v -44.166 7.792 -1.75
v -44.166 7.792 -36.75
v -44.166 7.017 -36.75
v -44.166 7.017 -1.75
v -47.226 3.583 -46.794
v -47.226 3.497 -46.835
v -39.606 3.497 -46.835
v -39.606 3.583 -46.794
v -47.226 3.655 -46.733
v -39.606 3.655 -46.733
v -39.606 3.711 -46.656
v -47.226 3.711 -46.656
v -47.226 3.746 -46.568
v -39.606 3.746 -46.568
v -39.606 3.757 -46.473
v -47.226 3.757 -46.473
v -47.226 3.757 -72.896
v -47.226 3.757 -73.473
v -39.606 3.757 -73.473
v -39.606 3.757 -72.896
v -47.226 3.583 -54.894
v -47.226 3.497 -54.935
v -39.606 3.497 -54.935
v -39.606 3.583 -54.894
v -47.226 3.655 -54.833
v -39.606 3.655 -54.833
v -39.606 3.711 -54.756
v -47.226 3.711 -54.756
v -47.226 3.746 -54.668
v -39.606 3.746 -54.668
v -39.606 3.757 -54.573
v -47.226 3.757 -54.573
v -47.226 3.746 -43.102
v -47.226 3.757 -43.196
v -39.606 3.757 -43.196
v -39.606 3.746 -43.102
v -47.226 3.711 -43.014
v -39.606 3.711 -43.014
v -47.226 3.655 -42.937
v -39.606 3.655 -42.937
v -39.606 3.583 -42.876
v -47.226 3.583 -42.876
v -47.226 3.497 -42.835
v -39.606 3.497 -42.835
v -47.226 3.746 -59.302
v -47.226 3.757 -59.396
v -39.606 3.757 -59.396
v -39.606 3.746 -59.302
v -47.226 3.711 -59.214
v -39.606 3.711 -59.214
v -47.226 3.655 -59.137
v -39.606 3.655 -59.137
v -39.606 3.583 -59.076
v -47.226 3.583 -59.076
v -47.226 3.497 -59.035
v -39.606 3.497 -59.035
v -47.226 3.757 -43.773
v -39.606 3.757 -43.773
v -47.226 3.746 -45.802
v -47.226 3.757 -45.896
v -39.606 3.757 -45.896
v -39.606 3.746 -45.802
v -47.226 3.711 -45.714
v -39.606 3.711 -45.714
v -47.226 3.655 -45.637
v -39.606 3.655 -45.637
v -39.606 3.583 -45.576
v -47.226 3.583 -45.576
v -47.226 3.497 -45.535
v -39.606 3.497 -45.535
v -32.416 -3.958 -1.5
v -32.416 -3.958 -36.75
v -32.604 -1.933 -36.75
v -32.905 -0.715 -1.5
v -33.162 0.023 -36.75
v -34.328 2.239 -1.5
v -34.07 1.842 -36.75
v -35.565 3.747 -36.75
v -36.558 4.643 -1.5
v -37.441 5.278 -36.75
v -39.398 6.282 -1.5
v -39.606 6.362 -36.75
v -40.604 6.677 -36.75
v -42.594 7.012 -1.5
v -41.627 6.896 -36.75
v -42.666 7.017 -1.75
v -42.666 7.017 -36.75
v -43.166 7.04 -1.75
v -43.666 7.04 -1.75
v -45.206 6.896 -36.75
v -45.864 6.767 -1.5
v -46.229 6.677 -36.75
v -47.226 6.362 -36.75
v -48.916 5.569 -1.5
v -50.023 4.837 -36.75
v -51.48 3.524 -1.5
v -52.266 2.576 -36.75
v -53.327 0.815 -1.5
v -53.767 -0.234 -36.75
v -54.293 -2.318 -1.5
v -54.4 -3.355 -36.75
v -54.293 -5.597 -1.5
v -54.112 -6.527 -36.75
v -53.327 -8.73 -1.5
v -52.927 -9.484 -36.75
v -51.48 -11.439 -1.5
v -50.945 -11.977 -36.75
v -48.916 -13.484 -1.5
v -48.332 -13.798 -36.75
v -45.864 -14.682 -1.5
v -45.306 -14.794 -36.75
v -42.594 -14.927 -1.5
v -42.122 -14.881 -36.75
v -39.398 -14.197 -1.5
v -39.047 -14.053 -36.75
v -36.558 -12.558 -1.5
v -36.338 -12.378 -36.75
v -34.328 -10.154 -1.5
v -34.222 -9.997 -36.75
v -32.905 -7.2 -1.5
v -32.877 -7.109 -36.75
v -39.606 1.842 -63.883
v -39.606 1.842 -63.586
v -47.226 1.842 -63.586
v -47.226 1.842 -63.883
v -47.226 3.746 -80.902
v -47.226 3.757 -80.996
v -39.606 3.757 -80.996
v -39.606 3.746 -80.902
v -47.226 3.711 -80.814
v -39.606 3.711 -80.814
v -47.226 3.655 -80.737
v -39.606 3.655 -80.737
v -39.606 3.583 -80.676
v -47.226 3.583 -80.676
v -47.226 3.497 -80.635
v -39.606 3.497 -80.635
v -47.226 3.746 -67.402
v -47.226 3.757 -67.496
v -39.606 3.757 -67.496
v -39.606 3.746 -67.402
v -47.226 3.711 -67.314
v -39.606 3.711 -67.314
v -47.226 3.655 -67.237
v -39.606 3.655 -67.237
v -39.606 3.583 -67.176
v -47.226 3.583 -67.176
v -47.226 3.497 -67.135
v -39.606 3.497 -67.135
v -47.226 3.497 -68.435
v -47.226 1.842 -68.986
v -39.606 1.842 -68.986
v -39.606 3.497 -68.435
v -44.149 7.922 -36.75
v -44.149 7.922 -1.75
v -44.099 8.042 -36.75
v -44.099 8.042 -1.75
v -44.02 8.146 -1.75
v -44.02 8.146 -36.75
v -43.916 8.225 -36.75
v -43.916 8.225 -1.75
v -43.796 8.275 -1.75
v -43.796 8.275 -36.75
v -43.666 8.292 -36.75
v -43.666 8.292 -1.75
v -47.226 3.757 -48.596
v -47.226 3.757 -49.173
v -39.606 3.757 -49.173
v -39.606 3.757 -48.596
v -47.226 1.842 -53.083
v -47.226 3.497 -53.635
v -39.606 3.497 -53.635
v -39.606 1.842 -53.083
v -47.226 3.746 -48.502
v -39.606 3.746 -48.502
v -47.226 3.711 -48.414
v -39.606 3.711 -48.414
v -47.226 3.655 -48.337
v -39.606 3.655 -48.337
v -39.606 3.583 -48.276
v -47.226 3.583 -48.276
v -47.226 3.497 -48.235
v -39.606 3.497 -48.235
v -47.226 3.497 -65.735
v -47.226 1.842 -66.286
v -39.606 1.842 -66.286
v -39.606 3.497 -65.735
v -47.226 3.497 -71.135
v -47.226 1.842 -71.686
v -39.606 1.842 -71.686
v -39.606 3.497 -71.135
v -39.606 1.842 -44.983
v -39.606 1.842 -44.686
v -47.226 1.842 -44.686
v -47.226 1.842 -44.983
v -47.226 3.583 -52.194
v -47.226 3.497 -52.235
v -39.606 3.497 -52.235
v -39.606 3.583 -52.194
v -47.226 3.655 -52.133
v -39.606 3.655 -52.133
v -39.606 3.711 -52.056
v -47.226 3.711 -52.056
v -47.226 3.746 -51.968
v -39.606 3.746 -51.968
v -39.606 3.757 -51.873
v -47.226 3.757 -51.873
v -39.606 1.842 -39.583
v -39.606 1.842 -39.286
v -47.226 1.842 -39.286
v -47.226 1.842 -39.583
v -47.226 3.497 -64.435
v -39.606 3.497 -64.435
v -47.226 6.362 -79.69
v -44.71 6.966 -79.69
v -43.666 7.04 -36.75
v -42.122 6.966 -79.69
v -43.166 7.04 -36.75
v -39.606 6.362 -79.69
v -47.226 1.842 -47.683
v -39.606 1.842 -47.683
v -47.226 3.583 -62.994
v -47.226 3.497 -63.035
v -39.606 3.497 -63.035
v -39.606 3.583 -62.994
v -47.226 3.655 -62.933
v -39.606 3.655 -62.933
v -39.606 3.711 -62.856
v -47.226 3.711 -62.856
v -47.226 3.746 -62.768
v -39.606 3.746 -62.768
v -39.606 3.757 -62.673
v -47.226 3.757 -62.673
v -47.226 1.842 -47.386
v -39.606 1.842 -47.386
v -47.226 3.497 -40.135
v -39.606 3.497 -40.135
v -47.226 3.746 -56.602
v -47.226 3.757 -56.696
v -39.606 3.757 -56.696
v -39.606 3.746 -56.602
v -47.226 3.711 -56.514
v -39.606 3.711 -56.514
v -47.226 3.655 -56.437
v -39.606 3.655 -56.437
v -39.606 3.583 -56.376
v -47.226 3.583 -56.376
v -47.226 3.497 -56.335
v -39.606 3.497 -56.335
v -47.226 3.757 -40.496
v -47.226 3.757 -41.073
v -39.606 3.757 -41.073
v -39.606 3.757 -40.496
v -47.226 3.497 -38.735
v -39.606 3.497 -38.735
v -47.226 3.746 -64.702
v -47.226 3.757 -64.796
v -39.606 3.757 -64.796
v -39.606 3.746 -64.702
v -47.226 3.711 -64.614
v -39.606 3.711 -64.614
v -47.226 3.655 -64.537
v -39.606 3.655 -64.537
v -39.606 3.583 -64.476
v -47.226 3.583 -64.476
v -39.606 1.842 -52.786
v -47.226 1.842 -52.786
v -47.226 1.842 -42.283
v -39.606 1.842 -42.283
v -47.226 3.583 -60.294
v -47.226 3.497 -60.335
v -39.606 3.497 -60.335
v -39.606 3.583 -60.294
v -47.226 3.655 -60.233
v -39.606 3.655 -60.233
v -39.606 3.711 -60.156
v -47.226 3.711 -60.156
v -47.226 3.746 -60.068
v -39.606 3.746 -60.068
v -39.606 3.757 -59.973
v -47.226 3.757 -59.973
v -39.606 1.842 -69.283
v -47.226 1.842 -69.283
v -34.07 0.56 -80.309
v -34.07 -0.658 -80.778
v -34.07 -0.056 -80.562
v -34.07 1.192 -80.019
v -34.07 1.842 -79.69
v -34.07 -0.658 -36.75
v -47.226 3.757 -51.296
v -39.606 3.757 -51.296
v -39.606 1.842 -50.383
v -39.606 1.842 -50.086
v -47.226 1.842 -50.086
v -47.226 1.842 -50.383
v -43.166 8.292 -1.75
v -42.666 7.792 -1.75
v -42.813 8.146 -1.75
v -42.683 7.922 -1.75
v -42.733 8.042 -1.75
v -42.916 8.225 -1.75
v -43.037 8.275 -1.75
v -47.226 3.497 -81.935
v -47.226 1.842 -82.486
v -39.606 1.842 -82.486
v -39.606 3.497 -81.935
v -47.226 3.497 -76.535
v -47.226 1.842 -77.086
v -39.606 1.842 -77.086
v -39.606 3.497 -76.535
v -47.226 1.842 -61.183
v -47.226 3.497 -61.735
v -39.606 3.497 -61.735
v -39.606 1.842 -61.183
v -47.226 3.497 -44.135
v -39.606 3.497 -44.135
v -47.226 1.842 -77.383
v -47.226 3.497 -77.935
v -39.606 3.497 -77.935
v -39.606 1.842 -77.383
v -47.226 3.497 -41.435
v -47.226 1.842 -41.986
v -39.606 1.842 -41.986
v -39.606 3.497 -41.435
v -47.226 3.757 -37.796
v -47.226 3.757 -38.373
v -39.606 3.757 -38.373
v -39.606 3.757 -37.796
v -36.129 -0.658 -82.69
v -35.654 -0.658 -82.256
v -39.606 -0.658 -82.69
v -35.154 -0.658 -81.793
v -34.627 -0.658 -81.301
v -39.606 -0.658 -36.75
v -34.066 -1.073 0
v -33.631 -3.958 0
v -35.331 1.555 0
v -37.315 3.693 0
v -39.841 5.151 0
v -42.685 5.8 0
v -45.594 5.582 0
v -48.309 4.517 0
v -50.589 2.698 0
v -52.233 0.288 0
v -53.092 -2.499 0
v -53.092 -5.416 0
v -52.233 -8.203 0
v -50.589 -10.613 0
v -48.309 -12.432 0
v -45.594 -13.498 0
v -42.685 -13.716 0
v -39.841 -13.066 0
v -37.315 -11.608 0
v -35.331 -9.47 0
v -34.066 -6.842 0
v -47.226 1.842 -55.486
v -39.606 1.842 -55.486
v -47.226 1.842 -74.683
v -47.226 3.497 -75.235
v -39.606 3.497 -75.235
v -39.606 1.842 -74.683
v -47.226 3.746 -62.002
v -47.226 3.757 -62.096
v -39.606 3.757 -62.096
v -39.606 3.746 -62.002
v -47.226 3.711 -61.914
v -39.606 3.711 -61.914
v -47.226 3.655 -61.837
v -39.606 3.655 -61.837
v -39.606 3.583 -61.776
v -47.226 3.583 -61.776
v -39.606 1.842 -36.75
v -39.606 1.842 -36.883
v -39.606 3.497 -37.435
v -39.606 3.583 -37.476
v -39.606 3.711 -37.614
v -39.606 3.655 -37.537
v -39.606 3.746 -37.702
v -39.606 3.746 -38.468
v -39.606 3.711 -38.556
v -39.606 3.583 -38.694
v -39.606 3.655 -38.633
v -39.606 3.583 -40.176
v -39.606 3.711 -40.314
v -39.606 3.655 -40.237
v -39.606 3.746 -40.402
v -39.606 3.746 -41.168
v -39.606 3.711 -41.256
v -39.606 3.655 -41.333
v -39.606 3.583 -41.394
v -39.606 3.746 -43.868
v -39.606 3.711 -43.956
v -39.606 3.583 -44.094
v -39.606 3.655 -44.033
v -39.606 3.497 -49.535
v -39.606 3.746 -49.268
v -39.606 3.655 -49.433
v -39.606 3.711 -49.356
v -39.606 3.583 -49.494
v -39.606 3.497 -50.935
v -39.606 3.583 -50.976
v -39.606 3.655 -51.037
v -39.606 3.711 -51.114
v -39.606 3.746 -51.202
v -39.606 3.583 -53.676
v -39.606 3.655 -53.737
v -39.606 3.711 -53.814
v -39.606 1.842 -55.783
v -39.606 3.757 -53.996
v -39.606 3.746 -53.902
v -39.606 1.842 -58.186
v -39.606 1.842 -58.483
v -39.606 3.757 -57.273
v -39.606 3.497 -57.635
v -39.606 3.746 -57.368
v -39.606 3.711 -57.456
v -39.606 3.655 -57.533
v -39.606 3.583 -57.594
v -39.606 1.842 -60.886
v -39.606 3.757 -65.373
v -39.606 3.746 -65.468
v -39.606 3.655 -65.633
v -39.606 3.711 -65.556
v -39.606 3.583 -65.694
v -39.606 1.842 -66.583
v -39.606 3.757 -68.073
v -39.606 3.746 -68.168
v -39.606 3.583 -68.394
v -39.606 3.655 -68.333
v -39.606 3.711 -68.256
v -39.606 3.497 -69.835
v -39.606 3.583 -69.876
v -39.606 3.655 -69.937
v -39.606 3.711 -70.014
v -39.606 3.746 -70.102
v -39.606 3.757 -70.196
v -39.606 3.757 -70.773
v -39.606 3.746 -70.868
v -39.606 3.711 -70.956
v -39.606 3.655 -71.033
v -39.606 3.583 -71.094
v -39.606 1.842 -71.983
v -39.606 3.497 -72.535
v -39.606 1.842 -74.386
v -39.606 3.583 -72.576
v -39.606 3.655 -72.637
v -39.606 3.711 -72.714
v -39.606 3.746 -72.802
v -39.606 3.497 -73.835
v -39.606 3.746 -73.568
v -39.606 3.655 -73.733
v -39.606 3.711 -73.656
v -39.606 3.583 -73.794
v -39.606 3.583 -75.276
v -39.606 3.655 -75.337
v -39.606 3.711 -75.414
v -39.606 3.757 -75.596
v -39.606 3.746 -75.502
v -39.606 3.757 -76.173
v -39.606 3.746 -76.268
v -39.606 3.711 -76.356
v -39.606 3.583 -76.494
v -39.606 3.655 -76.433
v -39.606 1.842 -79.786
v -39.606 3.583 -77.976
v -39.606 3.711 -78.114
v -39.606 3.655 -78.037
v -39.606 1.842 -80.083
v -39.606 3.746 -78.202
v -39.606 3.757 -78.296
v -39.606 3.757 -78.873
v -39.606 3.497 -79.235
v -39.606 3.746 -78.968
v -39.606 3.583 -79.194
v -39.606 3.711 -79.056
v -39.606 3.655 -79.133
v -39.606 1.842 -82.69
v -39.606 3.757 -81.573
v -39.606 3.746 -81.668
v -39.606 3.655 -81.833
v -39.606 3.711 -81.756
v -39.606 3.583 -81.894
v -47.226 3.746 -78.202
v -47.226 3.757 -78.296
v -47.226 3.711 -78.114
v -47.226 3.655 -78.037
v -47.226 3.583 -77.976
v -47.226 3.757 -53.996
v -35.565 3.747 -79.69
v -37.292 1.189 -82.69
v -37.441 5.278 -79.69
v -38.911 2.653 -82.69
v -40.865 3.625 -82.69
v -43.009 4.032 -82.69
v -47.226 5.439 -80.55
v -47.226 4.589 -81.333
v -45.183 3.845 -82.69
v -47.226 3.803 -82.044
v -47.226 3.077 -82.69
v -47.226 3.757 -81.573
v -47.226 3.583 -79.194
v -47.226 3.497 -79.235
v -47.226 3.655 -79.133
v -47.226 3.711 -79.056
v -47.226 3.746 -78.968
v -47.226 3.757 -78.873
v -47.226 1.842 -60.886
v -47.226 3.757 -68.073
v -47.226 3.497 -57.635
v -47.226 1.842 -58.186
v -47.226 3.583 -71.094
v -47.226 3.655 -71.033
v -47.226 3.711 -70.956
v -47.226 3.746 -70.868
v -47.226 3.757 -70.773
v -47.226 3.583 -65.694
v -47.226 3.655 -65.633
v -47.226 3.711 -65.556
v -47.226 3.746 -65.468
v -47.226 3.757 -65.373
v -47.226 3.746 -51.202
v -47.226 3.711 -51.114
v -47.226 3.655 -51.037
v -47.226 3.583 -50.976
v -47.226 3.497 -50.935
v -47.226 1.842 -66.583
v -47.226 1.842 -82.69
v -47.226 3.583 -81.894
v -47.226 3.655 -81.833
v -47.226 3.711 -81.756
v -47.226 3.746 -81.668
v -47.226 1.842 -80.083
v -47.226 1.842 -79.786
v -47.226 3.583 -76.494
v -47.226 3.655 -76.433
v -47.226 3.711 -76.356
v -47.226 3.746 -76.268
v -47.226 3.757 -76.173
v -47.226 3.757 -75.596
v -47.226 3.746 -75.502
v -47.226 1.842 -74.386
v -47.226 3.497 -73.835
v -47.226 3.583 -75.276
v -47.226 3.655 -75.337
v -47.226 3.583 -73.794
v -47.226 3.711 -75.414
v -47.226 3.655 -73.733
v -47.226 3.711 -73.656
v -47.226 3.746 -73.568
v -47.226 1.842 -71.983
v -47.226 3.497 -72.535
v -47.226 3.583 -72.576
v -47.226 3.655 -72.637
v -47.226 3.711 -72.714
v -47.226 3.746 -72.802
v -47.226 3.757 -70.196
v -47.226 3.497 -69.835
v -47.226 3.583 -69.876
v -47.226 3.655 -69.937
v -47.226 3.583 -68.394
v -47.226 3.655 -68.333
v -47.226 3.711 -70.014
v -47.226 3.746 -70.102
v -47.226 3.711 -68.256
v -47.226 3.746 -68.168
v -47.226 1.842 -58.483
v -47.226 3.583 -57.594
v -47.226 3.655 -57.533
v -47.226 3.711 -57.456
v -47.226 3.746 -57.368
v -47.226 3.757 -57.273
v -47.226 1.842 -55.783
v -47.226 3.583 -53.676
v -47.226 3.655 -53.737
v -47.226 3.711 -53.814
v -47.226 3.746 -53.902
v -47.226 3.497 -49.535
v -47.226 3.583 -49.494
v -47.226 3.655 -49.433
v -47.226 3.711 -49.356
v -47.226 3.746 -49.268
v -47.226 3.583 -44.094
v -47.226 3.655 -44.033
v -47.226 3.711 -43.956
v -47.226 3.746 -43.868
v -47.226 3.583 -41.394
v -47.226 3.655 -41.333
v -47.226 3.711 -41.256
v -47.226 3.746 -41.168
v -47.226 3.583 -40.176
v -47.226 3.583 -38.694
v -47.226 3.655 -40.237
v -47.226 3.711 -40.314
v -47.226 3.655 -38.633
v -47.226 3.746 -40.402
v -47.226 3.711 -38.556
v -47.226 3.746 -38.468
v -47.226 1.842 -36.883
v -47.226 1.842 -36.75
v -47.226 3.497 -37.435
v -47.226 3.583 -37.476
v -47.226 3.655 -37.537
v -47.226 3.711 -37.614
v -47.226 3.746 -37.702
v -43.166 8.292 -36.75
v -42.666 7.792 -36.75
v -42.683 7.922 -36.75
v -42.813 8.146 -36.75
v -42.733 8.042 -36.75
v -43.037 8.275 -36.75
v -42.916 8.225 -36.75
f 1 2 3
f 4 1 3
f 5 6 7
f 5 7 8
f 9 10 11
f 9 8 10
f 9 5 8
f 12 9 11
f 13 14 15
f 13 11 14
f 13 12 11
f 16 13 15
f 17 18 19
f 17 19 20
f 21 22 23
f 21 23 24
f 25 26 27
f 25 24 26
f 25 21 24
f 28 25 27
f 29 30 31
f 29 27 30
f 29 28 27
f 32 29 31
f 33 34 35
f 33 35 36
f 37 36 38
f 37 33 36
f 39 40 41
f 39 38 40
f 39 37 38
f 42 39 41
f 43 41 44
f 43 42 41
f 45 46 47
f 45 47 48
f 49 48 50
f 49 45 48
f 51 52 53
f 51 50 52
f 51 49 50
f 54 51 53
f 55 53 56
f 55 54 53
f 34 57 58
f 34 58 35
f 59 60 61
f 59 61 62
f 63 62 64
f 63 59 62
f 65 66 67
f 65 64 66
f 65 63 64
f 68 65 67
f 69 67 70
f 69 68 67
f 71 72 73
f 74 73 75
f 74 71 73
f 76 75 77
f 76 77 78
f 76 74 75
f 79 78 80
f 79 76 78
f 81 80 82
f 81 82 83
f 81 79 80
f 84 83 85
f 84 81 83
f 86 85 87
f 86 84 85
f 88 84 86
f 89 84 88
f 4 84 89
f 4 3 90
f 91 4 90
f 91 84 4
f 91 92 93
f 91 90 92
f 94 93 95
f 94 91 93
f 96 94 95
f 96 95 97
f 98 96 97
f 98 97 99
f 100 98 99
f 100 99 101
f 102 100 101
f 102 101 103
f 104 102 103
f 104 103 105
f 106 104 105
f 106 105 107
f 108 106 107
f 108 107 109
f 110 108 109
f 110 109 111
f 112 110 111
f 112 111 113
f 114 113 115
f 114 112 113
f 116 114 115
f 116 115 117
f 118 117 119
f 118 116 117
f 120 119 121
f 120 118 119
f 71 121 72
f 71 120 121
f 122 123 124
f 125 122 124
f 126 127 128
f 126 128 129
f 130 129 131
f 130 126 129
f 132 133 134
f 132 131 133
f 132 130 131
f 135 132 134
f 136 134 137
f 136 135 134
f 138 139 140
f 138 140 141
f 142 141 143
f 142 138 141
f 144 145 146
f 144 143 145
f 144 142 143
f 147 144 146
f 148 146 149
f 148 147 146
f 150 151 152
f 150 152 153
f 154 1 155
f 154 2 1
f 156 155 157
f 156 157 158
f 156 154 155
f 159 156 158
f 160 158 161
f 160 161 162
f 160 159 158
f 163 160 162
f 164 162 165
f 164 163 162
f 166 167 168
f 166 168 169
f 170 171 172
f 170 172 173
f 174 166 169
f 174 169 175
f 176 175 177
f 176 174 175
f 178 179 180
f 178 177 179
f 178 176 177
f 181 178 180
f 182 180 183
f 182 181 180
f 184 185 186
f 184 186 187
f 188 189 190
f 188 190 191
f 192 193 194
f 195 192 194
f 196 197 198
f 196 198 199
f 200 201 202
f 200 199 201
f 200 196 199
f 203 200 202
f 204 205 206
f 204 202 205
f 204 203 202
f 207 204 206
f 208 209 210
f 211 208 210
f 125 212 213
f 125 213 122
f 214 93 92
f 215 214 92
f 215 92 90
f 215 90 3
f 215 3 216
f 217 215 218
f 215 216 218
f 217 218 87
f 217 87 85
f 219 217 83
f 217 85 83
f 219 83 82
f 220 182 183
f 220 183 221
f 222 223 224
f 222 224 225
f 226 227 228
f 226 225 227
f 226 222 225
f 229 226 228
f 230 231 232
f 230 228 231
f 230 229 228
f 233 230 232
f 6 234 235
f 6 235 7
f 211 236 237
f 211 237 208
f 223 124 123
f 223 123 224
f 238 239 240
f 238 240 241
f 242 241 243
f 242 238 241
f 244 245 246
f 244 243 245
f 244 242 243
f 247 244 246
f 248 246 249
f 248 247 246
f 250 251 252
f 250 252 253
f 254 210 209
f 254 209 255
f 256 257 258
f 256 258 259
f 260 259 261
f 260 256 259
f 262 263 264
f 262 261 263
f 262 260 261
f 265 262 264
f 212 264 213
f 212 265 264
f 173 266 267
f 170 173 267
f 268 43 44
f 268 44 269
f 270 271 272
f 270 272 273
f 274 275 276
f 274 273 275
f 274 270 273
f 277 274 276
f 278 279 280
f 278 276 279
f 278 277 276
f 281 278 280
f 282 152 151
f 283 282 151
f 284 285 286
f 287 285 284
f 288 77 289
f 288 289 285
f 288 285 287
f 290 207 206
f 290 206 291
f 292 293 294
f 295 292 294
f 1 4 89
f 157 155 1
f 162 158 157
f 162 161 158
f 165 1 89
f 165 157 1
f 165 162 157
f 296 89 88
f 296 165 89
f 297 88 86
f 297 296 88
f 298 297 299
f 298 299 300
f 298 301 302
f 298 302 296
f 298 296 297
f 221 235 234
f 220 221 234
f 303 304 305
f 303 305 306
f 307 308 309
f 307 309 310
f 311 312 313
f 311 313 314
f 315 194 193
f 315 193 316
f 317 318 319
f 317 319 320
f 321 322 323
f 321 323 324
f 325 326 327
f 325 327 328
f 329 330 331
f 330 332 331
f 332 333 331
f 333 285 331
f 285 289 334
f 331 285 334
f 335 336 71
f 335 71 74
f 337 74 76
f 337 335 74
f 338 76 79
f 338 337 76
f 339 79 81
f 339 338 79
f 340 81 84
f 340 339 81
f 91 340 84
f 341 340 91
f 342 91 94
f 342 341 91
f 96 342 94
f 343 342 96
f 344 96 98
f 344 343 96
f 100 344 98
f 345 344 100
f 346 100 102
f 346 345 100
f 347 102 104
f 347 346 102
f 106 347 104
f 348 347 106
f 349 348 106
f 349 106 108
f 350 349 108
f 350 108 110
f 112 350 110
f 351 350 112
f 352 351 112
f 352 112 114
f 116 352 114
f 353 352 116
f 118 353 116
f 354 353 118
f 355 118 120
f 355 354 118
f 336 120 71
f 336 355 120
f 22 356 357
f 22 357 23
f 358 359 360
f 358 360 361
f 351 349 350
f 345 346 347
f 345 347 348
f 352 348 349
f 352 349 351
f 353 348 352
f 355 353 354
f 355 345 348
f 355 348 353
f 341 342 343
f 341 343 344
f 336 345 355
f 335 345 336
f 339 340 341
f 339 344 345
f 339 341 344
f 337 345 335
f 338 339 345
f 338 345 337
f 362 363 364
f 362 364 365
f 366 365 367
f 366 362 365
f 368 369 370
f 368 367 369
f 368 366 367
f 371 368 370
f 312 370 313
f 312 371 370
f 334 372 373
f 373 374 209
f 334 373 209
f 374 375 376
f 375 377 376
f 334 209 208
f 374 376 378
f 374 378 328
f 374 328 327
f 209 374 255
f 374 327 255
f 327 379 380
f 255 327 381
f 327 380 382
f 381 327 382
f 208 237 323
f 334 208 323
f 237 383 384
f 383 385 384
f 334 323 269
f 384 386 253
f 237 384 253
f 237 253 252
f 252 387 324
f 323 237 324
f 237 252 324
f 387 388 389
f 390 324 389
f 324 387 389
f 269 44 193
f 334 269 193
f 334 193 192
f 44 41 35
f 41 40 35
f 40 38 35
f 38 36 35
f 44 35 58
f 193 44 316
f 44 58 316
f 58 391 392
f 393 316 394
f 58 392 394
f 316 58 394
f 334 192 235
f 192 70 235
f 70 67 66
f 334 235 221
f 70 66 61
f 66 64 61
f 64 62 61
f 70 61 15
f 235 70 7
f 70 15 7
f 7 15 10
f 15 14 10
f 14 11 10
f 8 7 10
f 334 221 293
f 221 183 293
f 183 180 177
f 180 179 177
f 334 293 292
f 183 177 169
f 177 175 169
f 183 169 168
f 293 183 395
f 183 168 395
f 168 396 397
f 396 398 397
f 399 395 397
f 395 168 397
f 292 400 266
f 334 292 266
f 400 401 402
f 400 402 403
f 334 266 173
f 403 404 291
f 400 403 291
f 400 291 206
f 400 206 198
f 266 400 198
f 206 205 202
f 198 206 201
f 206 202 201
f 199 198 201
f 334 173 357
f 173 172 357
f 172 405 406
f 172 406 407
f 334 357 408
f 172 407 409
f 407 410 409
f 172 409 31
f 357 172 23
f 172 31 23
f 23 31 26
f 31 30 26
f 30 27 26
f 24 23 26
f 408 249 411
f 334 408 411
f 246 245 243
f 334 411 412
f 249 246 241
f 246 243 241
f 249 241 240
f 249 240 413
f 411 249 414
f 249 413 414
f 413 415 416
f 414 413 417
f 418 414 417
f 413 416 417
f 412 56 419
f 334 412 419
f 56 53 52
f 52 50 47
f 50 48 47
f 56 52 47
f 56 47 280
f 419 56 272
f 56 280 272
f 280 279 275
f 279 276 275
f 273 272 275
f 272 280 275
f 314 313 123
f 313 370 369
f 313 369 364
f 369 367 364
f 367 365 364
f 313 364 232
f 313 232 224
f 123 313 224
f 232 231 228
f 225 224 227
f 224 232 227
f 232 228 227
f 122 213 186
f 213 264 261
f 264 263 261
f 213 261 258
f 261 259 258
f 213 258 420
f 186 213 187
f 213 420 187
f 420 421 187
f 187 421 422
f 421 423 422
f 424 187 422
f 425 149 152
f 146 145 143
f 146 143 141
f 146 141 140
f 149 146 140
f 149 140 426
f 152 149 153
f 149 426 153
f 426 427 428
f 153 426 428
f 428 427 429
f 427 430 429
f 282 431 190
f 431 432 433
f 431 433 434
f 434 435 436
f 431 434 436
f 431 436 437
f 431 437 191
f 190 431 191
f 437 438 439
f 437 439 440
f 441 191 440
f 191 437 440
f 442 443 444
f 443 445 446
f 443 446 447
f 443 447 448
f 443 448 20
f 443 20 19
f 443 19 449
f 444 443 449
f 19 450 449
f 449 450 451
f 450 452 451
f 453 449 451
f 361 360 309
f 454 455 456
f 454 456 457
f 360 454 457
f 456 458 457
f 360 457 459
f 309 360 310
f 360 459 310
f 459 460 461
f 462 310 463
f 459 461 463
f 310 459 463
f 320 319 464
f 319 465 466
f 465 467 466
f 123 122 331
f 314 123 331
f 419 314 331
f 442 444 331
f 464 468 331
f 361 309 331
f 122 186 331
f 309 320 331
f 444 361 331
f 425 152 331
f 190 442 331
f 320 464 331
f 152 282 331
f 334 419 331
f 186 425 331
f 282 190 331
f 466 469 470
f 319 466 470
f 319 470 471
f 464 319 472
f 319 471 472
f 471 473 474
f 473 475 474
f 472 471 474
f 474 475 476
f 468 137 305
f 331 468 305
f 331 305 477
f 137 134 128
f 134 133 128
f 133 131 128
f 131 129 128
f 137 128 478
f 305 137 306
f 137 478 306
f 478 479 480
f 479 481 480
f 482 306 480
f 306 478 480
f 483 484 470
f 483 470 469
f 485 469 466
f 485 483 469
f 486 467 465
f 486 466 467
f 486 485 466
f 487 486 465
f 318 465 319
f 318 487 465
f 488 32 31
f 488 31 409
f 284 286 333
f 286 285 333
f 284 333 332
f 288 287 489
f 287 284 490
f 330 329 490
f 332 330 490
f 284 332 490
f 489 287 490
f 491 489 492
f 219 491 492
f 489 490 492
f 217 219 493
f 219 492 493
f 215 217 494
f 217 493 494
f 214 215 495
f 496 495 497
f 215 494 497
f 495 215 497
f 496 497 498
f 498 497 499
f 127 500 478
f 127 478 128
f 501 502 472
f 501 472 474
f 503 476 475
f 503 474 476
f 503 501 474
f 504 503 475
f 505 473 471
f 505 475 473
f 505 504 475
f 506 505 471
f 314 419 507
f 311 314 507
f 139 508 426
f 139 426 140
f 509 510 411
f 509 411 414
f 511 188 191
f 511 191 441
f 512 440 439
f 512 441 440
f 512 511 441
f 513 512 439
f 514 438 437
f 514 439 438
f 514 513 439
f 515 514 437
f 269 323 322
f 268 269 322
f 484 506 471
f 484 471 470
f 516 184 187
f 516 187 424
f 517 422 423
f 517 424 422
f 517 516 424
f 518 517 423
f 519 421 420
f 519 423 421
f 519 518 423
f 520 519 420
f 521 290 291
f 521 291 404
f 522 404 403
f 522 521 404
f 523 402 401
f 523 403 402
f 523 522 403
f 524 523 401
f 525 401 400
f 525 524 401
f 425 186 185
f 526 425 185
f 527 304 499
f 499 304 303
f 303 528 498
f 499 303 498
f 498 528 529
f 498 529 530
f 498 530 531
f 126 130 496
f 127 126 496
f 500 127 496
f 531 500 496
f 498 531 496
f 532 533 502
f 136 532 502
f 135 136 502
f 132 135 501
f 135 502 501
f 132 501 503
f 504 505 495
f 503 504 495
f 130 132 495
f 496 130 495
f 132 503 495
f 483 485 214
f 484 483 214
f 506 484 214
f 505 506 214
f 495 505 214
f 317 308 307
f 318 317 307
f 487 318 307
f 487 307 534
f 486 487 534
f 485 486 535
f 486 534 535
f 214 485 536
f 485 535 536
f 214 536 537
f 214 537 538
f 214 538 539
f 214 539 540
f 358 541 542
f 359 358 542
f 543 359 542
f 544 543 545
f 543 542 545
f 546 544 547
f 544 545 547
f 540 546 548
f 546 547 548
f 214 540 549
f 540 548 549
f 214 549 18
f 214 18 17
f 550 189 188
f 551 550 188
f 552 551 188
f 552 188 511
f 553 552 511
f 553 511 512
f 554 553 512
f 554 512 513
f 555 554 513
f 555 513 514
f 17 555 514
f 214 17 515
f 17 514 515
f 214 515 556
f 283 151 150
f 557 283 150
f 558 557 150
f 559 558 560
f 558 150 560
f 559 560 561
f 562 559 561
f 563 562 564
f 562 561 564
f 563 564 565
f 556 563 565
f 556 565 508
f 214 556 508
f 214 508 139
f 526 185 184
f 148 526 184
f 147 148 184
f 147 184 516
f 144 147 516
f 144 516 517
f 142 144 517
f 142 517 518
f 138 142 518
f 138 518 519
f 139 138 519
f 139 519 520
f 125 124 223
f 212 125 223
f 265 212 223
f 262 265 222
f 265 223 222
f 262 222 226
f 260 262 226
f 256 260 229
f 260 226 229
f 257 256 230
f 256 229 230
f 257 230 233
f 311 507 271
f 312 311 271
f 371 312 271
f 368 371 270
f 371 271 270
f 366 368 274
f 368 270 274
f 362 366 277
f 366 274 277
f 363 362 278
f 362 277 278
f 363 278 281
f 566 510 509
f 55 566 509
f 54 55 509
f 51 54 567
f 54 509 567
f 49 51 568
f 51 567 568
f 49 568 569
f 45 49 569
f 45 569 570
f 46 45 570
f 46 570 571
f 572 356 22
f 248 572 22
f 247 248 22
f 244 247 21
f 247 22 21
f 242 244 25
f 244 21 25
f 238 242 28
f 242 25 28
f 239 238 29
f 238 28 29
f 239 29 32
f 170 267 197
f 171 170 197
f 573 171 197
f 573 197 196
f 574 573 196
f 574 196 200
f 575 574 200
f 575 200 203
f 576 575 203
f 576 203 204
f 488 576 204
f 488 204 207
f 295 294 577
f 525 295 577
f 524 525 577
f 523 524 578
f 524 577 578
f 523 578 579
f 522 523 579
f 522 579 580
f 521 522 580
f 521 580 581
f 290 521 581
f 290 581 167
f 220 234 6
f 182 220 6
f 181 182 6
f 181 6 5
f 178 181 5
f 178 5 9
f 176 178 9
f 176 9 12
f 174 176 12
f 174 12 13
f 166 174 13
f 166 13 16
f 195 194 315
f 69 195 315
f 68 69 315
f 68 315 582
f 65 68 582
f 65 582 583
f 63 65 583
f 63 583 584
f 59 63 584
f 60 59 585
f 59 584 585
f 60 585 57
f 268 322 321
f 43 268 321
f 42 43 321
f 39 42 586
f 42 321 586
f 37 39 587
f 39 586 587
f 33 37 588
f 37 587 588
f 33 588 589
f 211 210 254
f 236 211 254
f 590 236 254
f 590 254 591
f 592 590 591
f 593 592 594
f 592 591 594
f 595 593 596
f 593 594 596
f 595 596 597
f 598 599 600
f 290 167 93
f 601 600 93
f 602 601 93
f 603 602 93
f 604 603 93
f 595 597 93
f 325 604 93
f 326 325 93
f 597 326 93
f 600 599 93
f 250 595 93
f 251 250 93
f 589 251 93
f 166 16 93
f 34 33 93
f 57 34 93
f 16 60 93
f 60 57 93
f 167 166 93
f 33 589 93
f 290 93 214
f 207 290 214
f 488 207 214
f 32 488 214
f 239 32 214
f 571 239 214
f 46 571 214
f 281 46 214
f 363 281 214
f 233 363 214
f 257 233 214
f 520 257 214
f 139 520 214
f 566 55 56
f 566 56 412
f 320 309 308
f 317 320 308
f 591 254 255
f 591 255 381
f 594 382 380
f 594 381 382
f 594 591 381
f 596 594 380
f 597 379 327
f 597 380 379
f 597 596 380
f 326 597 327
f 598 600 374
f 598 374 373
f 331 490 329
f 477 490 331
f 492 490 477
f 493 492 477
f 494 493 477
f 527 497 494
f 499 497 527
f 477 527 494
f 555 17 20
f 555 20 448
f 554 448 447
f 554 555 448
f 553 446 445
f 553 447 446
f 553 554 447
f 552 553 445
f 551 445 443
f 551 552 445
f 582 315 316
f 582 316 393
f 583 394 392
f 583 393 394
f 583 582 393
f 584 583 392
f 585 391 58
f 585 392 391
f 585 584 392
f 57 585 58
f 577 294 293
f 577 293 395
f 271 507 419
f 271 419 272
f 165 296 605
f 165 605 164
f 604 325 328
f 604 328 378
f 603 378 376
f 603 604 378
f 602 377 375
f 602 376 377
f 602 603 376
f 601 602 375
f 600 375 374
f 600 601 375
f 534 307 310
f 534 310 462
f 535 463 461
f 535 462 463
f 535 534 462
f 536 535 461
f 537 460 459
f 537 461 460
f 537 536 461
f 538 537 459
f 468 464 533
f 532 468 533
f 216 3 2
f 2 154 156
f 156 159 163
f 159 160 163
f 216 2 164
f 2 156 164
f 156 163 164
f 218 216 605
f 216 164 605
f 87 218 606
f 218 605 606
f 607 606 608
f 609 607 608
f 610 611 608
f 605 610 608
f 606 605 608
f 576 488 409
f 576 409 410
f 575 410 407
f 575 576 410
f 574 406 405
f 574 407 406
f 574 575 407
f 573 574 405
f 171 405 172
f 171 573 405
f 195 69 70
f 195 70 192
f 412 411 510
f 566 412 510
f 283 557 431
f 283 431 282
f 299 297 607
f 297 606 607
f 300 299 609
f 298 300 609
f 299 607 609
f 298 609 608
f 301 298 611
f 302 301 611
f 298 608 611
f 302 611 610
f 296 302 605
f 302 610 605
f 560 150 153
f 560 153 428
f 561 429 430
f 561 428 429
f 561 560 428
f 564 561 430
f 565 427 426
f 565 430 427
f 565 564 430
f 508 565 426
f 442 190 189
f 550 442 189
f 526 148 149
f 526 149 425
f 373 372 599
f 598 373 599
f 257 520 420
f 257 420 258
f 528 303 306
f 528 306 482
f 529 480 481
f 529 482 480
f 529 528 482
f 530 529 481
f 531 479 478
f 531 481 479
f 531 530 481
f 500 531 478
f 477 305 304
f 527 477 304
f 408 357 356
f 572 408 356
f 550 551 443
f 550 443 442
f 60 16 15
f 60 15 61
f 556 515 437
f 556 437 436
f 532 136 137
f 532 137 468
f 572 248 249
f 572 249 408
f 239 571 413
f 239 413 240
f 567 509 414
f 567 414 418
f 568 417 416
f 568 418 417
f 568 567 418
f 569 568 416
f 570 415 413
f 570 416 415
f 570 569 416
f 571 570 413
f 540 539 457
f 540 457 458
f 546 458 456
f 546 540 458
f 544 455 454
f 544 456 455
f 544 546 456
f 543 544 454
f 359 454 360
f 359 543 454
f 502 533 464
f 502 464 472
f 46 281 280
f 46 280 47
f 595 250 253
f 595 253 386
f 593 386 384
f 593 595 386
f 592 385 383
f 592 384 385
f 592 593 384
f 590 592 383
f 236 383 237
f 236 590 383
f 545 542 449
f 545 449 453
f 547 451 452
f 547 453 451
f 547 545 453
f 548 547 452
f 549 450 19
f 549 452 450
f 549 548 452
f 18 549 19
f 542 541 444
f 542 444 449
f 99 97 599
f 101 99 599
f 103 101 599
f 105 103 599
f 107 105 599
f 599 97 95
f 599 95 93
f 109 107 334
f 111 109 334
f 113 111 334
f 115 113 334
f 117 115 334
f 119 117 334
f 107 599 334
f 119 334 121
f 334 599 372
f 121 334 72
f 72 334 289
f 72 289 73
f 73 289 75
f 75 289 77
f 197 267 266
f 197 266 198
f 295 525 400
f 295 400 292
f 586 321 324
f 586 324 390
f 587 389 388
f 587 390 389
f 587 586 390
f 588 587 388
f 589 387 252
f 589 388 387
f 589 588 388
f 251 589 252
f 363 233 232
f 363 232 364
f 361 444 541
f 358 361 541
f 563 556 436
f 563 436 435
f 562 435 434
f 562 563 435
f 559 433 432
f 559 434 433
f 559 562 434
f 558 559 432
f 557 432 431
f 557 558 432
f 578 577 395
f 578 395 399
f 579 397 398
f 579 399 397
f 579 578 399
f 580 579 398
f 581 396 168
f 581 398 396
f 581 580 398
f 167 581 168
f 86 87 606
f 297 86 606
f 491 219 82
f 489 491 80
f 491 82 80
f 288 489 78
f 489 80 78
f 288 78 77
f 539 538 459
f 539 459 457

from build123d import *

# Parameters (mm, degrees)
SKETCH14_R           = 11
BOSS_EXTRUDE7_DEPTH  = 36.75
SKETCH18_W           = 7.62
SKETCH18_H           = 4.5
BOSS_EXTRUDE9_DEPTH  = 45.94
CUT_EXTRUDE16_REACH  = 87.359
LPATTERN1_COUNT      = 17
LPATTERN1_PITCH      = 2.7
BOSS_EXTRUDE10_DEPTH = 45.94
CHAMFER2_SIZE        = 1.5
CHAMFER2_SIZE2       = 1.21467605
BOSS_EXTRUDE11_DEPTH = 45.94
BOSS_EXTRUDE12_DEPTH = 2.5
BOSS_EXTRUDE14_START = -35
BOSS_EXTRUDE14_DEPTH = 35
FILLET2_R            = 0.5


with BuildPart() as part:
    # Sketch14 → Boss-Extrude7 (new body)
    with BuildSketch(Plane.XY):
        with Locations((-43.416294802, -3.957587863)):
            Circle(SKETCH14_R)
    extrude(amount=-BOSS_EXTRUDE7_DEPTH)

    # Sketch18 → Boss-Extrude9 (add)
    with BuildSketch(Plane(origin=(0, 0, -36.75), x_dir=(-1, 0, 0), z_dir=(0, 0, -1))):
        with Locations((43.416294802, 4.092412137)):
            Rectangle(SKETCH18_W, SKETCH18_H)
    extrude(amount=BOSS_EXTRUDE9_DEPTH)

    # Sketch19 → Cut-Extrude16 (cut, up to next)
    with BuildSketch(Plane.ZY.offset(47.409754566), mode=Mode.PRIVATE) as cut_extrude16_sk1:
        with BuildLine():
            Line((-81.573331938, 3.757468407), (-80.99640478, 3.757468407))
            ThreePointArc((-80.99640478, 3.757468407), (-80.773630162, 3.685551679), (-80.634956444, 3.496951186))
            Line((-80.634956444, 3.496951186), (-80.052462184, 1.749468407))
            Line((-80.052462184, 1.749468407), (-82.517274534, 1.749468407))
            Line((-82.517274534, 1.749468407), (-81.934780275, 3.496951186))
            ThreePointArc((-81.934780275, 3.496951186), (-81.796106557, 3.685551679), (-81.573331938, 3.757468407))
        make_face()
    cut_extrude16_tool1 = extrude(cut_extrude16_sk1.sketch, amount=-CUT_EXTRUDE16_REACH, mode=Mode.PRIVATE) & part.part
    cut_extrude16 = cut_extrude16_tool1.solids().sort_by_distance((-47.409755, 2.620329, -81.284868))[0]
    add(cut_extrude16, mode=Mode.SUBTRACT)

    # LPattern1: Cut-Extrude16 ×17
    with Locations(*[(0, 0, i * LPATTERN1_PITCH) for i in range(1, LPATTERN1_COUNT)]):
        add(cut_extrude16, mode=Mode.SUBTRACT)

    # Sketch20 → Boss-Extrude10 (add)
    with BuildSketch(Plane(origin=(0, 0, -36.75), x_dir=(-1, 0, 0), z_dir=(0, 0, -1))):
        with BuildLine():
            Line((39.606294802, 6.342412137), (47.226294802, 6.342412137))
            Line((47.226294802, 6.342412137), (47.226294802, 6.36151578))
            ThreePointArc((47.226294802, 6.36151578), (43.416294802, 7.042412137), (39.606294802, 6.36151578))
            Line((39.606294802, 6.36151578), (39.606294802, 6.342412137))
        make_face()
    extrude(amount=BOSS_EXTRUDE10_DEPTH)

    # Chamfer1: read off the stored shape, not the designer's step
    # Chamfer1 outline → Chamfer1 (revolve, cut)
    with BuildSketch(Plane(origin=(-43.416294802, -3.957587863, 0), x_dir=(1, 0, 0), z_dir=(0, -1, 0))):
        Polygon((11.000000059, -82.589999941), (10.9, -82.69), (11.000000059, -82.69), align=None)
    revolve(axis=Axis((-43.416294802, -3.957587863, 0), (0, 0, 1)), mode=Mode.SUBTRACT)

    # Chamfer2
    chamfer2_edges = [part.edges().sort_by_distance(p)[0] for p in [
        (-54.416294802, -3.957587863, 0),
    ]]
    chamfer2_side = [part.faces().sort_by_distance(p)[0] for p in [
        (-54.416294802, -3.957587863, -18.375),
    ]]
    chamfer(chamfer2_edges, length=CHAMFER2_SIZE, length2=CHAMFER2_SIZE2, reference=chamfer2_side[0])

    # Sketch21 → Boss-Extrude11 (add)
    with BuildSketch(Plane(origin=(0, 0, -36.75), x_dir=(-1, 0, 0), z_dir=(0, 0, -1))):
        with BuildLine():
            Line((39.606294802, 1.842412137), (39.606294802, 6.36151578))
            ThreePointArc((39.606294802, 6.36151578), (36.46072284, 4.564150146), (34.069637646, 1.842412137))
            Line((34.069637646, 1.842412137), (39.606294802, 1.842412137))
        make_face()
    extrude(amount=BOSS_EXTRUDE11_DEPTH)

    # Sketch23 → Boss-Extrude12 (add)
    with BuildSketch(Plane.XZ.offset(-1.842412137)):
        Polygon((-39.606294802, -36.883443427), (-39.606294802, -36.75), (-34.069637646, -36.75), (-34.069637646, -82.69), (-39.606294802, -82.69), (-39.606294802, -82.486293291), align=None)
    extrude(amount=BOSS_EXTRUDE12_DEPTH)

    # Chamfer4: read off the stored shape, not the designer's step
    # Chamfer4 outline → Chamfer4 (revolve, cut)
    with BuildSketch(Plane(origin=(-43.416294802, -3.957587863, 0), x_dir=(1, 0, 0), z_dir=(0, -1, 0))):
        Polygon((7.999999773, -82.690000227), (11.000000044, -82.69000017), (11.000000035, -79.69), align=None)
    revolve(axis=Axis((-43.416294802, -3.957587863, 0), (0, 0, 1)), mode=Mode.SUBTRACT)

    # Sketch24 → Boss-Extrude14 (add)
    with BuildSketch(Plane(origin=(0, 0, -36.75), x_dir=(-1, 0, 0), z_dir=(0, 0, -1)).offset(BOSS_EXTRUDE14_START)):
        with BuildLine():
            Line((42.666294802, 7.016814171), (42.666294802, 8.292412137))
            Line((42.666294802, 8.292412137), (44.166294802, 8.292412137))
            Line((44.166294802, 8.292412137), (44.166294802, 7.016814171))
            ThreePointArc((44.166294802, 7.016814171), (43.416294802, 7.042412137), (42.666294802, 7.016814171))
        make_face()
    extrude(amount=BOSS_EXTRUDE14_DEPTH)

    # Fillet2
    fillet2_edges = [part.edges().sort_by_distance(p)[0] for p in [
        (-42.666294802, 8.292412137, -19.25),
        (-44.166294802, 8.292412137, -19.25),
    ]]
    fillet(fillet2_edges, radius=FILLET2_R)


solid = part.part
